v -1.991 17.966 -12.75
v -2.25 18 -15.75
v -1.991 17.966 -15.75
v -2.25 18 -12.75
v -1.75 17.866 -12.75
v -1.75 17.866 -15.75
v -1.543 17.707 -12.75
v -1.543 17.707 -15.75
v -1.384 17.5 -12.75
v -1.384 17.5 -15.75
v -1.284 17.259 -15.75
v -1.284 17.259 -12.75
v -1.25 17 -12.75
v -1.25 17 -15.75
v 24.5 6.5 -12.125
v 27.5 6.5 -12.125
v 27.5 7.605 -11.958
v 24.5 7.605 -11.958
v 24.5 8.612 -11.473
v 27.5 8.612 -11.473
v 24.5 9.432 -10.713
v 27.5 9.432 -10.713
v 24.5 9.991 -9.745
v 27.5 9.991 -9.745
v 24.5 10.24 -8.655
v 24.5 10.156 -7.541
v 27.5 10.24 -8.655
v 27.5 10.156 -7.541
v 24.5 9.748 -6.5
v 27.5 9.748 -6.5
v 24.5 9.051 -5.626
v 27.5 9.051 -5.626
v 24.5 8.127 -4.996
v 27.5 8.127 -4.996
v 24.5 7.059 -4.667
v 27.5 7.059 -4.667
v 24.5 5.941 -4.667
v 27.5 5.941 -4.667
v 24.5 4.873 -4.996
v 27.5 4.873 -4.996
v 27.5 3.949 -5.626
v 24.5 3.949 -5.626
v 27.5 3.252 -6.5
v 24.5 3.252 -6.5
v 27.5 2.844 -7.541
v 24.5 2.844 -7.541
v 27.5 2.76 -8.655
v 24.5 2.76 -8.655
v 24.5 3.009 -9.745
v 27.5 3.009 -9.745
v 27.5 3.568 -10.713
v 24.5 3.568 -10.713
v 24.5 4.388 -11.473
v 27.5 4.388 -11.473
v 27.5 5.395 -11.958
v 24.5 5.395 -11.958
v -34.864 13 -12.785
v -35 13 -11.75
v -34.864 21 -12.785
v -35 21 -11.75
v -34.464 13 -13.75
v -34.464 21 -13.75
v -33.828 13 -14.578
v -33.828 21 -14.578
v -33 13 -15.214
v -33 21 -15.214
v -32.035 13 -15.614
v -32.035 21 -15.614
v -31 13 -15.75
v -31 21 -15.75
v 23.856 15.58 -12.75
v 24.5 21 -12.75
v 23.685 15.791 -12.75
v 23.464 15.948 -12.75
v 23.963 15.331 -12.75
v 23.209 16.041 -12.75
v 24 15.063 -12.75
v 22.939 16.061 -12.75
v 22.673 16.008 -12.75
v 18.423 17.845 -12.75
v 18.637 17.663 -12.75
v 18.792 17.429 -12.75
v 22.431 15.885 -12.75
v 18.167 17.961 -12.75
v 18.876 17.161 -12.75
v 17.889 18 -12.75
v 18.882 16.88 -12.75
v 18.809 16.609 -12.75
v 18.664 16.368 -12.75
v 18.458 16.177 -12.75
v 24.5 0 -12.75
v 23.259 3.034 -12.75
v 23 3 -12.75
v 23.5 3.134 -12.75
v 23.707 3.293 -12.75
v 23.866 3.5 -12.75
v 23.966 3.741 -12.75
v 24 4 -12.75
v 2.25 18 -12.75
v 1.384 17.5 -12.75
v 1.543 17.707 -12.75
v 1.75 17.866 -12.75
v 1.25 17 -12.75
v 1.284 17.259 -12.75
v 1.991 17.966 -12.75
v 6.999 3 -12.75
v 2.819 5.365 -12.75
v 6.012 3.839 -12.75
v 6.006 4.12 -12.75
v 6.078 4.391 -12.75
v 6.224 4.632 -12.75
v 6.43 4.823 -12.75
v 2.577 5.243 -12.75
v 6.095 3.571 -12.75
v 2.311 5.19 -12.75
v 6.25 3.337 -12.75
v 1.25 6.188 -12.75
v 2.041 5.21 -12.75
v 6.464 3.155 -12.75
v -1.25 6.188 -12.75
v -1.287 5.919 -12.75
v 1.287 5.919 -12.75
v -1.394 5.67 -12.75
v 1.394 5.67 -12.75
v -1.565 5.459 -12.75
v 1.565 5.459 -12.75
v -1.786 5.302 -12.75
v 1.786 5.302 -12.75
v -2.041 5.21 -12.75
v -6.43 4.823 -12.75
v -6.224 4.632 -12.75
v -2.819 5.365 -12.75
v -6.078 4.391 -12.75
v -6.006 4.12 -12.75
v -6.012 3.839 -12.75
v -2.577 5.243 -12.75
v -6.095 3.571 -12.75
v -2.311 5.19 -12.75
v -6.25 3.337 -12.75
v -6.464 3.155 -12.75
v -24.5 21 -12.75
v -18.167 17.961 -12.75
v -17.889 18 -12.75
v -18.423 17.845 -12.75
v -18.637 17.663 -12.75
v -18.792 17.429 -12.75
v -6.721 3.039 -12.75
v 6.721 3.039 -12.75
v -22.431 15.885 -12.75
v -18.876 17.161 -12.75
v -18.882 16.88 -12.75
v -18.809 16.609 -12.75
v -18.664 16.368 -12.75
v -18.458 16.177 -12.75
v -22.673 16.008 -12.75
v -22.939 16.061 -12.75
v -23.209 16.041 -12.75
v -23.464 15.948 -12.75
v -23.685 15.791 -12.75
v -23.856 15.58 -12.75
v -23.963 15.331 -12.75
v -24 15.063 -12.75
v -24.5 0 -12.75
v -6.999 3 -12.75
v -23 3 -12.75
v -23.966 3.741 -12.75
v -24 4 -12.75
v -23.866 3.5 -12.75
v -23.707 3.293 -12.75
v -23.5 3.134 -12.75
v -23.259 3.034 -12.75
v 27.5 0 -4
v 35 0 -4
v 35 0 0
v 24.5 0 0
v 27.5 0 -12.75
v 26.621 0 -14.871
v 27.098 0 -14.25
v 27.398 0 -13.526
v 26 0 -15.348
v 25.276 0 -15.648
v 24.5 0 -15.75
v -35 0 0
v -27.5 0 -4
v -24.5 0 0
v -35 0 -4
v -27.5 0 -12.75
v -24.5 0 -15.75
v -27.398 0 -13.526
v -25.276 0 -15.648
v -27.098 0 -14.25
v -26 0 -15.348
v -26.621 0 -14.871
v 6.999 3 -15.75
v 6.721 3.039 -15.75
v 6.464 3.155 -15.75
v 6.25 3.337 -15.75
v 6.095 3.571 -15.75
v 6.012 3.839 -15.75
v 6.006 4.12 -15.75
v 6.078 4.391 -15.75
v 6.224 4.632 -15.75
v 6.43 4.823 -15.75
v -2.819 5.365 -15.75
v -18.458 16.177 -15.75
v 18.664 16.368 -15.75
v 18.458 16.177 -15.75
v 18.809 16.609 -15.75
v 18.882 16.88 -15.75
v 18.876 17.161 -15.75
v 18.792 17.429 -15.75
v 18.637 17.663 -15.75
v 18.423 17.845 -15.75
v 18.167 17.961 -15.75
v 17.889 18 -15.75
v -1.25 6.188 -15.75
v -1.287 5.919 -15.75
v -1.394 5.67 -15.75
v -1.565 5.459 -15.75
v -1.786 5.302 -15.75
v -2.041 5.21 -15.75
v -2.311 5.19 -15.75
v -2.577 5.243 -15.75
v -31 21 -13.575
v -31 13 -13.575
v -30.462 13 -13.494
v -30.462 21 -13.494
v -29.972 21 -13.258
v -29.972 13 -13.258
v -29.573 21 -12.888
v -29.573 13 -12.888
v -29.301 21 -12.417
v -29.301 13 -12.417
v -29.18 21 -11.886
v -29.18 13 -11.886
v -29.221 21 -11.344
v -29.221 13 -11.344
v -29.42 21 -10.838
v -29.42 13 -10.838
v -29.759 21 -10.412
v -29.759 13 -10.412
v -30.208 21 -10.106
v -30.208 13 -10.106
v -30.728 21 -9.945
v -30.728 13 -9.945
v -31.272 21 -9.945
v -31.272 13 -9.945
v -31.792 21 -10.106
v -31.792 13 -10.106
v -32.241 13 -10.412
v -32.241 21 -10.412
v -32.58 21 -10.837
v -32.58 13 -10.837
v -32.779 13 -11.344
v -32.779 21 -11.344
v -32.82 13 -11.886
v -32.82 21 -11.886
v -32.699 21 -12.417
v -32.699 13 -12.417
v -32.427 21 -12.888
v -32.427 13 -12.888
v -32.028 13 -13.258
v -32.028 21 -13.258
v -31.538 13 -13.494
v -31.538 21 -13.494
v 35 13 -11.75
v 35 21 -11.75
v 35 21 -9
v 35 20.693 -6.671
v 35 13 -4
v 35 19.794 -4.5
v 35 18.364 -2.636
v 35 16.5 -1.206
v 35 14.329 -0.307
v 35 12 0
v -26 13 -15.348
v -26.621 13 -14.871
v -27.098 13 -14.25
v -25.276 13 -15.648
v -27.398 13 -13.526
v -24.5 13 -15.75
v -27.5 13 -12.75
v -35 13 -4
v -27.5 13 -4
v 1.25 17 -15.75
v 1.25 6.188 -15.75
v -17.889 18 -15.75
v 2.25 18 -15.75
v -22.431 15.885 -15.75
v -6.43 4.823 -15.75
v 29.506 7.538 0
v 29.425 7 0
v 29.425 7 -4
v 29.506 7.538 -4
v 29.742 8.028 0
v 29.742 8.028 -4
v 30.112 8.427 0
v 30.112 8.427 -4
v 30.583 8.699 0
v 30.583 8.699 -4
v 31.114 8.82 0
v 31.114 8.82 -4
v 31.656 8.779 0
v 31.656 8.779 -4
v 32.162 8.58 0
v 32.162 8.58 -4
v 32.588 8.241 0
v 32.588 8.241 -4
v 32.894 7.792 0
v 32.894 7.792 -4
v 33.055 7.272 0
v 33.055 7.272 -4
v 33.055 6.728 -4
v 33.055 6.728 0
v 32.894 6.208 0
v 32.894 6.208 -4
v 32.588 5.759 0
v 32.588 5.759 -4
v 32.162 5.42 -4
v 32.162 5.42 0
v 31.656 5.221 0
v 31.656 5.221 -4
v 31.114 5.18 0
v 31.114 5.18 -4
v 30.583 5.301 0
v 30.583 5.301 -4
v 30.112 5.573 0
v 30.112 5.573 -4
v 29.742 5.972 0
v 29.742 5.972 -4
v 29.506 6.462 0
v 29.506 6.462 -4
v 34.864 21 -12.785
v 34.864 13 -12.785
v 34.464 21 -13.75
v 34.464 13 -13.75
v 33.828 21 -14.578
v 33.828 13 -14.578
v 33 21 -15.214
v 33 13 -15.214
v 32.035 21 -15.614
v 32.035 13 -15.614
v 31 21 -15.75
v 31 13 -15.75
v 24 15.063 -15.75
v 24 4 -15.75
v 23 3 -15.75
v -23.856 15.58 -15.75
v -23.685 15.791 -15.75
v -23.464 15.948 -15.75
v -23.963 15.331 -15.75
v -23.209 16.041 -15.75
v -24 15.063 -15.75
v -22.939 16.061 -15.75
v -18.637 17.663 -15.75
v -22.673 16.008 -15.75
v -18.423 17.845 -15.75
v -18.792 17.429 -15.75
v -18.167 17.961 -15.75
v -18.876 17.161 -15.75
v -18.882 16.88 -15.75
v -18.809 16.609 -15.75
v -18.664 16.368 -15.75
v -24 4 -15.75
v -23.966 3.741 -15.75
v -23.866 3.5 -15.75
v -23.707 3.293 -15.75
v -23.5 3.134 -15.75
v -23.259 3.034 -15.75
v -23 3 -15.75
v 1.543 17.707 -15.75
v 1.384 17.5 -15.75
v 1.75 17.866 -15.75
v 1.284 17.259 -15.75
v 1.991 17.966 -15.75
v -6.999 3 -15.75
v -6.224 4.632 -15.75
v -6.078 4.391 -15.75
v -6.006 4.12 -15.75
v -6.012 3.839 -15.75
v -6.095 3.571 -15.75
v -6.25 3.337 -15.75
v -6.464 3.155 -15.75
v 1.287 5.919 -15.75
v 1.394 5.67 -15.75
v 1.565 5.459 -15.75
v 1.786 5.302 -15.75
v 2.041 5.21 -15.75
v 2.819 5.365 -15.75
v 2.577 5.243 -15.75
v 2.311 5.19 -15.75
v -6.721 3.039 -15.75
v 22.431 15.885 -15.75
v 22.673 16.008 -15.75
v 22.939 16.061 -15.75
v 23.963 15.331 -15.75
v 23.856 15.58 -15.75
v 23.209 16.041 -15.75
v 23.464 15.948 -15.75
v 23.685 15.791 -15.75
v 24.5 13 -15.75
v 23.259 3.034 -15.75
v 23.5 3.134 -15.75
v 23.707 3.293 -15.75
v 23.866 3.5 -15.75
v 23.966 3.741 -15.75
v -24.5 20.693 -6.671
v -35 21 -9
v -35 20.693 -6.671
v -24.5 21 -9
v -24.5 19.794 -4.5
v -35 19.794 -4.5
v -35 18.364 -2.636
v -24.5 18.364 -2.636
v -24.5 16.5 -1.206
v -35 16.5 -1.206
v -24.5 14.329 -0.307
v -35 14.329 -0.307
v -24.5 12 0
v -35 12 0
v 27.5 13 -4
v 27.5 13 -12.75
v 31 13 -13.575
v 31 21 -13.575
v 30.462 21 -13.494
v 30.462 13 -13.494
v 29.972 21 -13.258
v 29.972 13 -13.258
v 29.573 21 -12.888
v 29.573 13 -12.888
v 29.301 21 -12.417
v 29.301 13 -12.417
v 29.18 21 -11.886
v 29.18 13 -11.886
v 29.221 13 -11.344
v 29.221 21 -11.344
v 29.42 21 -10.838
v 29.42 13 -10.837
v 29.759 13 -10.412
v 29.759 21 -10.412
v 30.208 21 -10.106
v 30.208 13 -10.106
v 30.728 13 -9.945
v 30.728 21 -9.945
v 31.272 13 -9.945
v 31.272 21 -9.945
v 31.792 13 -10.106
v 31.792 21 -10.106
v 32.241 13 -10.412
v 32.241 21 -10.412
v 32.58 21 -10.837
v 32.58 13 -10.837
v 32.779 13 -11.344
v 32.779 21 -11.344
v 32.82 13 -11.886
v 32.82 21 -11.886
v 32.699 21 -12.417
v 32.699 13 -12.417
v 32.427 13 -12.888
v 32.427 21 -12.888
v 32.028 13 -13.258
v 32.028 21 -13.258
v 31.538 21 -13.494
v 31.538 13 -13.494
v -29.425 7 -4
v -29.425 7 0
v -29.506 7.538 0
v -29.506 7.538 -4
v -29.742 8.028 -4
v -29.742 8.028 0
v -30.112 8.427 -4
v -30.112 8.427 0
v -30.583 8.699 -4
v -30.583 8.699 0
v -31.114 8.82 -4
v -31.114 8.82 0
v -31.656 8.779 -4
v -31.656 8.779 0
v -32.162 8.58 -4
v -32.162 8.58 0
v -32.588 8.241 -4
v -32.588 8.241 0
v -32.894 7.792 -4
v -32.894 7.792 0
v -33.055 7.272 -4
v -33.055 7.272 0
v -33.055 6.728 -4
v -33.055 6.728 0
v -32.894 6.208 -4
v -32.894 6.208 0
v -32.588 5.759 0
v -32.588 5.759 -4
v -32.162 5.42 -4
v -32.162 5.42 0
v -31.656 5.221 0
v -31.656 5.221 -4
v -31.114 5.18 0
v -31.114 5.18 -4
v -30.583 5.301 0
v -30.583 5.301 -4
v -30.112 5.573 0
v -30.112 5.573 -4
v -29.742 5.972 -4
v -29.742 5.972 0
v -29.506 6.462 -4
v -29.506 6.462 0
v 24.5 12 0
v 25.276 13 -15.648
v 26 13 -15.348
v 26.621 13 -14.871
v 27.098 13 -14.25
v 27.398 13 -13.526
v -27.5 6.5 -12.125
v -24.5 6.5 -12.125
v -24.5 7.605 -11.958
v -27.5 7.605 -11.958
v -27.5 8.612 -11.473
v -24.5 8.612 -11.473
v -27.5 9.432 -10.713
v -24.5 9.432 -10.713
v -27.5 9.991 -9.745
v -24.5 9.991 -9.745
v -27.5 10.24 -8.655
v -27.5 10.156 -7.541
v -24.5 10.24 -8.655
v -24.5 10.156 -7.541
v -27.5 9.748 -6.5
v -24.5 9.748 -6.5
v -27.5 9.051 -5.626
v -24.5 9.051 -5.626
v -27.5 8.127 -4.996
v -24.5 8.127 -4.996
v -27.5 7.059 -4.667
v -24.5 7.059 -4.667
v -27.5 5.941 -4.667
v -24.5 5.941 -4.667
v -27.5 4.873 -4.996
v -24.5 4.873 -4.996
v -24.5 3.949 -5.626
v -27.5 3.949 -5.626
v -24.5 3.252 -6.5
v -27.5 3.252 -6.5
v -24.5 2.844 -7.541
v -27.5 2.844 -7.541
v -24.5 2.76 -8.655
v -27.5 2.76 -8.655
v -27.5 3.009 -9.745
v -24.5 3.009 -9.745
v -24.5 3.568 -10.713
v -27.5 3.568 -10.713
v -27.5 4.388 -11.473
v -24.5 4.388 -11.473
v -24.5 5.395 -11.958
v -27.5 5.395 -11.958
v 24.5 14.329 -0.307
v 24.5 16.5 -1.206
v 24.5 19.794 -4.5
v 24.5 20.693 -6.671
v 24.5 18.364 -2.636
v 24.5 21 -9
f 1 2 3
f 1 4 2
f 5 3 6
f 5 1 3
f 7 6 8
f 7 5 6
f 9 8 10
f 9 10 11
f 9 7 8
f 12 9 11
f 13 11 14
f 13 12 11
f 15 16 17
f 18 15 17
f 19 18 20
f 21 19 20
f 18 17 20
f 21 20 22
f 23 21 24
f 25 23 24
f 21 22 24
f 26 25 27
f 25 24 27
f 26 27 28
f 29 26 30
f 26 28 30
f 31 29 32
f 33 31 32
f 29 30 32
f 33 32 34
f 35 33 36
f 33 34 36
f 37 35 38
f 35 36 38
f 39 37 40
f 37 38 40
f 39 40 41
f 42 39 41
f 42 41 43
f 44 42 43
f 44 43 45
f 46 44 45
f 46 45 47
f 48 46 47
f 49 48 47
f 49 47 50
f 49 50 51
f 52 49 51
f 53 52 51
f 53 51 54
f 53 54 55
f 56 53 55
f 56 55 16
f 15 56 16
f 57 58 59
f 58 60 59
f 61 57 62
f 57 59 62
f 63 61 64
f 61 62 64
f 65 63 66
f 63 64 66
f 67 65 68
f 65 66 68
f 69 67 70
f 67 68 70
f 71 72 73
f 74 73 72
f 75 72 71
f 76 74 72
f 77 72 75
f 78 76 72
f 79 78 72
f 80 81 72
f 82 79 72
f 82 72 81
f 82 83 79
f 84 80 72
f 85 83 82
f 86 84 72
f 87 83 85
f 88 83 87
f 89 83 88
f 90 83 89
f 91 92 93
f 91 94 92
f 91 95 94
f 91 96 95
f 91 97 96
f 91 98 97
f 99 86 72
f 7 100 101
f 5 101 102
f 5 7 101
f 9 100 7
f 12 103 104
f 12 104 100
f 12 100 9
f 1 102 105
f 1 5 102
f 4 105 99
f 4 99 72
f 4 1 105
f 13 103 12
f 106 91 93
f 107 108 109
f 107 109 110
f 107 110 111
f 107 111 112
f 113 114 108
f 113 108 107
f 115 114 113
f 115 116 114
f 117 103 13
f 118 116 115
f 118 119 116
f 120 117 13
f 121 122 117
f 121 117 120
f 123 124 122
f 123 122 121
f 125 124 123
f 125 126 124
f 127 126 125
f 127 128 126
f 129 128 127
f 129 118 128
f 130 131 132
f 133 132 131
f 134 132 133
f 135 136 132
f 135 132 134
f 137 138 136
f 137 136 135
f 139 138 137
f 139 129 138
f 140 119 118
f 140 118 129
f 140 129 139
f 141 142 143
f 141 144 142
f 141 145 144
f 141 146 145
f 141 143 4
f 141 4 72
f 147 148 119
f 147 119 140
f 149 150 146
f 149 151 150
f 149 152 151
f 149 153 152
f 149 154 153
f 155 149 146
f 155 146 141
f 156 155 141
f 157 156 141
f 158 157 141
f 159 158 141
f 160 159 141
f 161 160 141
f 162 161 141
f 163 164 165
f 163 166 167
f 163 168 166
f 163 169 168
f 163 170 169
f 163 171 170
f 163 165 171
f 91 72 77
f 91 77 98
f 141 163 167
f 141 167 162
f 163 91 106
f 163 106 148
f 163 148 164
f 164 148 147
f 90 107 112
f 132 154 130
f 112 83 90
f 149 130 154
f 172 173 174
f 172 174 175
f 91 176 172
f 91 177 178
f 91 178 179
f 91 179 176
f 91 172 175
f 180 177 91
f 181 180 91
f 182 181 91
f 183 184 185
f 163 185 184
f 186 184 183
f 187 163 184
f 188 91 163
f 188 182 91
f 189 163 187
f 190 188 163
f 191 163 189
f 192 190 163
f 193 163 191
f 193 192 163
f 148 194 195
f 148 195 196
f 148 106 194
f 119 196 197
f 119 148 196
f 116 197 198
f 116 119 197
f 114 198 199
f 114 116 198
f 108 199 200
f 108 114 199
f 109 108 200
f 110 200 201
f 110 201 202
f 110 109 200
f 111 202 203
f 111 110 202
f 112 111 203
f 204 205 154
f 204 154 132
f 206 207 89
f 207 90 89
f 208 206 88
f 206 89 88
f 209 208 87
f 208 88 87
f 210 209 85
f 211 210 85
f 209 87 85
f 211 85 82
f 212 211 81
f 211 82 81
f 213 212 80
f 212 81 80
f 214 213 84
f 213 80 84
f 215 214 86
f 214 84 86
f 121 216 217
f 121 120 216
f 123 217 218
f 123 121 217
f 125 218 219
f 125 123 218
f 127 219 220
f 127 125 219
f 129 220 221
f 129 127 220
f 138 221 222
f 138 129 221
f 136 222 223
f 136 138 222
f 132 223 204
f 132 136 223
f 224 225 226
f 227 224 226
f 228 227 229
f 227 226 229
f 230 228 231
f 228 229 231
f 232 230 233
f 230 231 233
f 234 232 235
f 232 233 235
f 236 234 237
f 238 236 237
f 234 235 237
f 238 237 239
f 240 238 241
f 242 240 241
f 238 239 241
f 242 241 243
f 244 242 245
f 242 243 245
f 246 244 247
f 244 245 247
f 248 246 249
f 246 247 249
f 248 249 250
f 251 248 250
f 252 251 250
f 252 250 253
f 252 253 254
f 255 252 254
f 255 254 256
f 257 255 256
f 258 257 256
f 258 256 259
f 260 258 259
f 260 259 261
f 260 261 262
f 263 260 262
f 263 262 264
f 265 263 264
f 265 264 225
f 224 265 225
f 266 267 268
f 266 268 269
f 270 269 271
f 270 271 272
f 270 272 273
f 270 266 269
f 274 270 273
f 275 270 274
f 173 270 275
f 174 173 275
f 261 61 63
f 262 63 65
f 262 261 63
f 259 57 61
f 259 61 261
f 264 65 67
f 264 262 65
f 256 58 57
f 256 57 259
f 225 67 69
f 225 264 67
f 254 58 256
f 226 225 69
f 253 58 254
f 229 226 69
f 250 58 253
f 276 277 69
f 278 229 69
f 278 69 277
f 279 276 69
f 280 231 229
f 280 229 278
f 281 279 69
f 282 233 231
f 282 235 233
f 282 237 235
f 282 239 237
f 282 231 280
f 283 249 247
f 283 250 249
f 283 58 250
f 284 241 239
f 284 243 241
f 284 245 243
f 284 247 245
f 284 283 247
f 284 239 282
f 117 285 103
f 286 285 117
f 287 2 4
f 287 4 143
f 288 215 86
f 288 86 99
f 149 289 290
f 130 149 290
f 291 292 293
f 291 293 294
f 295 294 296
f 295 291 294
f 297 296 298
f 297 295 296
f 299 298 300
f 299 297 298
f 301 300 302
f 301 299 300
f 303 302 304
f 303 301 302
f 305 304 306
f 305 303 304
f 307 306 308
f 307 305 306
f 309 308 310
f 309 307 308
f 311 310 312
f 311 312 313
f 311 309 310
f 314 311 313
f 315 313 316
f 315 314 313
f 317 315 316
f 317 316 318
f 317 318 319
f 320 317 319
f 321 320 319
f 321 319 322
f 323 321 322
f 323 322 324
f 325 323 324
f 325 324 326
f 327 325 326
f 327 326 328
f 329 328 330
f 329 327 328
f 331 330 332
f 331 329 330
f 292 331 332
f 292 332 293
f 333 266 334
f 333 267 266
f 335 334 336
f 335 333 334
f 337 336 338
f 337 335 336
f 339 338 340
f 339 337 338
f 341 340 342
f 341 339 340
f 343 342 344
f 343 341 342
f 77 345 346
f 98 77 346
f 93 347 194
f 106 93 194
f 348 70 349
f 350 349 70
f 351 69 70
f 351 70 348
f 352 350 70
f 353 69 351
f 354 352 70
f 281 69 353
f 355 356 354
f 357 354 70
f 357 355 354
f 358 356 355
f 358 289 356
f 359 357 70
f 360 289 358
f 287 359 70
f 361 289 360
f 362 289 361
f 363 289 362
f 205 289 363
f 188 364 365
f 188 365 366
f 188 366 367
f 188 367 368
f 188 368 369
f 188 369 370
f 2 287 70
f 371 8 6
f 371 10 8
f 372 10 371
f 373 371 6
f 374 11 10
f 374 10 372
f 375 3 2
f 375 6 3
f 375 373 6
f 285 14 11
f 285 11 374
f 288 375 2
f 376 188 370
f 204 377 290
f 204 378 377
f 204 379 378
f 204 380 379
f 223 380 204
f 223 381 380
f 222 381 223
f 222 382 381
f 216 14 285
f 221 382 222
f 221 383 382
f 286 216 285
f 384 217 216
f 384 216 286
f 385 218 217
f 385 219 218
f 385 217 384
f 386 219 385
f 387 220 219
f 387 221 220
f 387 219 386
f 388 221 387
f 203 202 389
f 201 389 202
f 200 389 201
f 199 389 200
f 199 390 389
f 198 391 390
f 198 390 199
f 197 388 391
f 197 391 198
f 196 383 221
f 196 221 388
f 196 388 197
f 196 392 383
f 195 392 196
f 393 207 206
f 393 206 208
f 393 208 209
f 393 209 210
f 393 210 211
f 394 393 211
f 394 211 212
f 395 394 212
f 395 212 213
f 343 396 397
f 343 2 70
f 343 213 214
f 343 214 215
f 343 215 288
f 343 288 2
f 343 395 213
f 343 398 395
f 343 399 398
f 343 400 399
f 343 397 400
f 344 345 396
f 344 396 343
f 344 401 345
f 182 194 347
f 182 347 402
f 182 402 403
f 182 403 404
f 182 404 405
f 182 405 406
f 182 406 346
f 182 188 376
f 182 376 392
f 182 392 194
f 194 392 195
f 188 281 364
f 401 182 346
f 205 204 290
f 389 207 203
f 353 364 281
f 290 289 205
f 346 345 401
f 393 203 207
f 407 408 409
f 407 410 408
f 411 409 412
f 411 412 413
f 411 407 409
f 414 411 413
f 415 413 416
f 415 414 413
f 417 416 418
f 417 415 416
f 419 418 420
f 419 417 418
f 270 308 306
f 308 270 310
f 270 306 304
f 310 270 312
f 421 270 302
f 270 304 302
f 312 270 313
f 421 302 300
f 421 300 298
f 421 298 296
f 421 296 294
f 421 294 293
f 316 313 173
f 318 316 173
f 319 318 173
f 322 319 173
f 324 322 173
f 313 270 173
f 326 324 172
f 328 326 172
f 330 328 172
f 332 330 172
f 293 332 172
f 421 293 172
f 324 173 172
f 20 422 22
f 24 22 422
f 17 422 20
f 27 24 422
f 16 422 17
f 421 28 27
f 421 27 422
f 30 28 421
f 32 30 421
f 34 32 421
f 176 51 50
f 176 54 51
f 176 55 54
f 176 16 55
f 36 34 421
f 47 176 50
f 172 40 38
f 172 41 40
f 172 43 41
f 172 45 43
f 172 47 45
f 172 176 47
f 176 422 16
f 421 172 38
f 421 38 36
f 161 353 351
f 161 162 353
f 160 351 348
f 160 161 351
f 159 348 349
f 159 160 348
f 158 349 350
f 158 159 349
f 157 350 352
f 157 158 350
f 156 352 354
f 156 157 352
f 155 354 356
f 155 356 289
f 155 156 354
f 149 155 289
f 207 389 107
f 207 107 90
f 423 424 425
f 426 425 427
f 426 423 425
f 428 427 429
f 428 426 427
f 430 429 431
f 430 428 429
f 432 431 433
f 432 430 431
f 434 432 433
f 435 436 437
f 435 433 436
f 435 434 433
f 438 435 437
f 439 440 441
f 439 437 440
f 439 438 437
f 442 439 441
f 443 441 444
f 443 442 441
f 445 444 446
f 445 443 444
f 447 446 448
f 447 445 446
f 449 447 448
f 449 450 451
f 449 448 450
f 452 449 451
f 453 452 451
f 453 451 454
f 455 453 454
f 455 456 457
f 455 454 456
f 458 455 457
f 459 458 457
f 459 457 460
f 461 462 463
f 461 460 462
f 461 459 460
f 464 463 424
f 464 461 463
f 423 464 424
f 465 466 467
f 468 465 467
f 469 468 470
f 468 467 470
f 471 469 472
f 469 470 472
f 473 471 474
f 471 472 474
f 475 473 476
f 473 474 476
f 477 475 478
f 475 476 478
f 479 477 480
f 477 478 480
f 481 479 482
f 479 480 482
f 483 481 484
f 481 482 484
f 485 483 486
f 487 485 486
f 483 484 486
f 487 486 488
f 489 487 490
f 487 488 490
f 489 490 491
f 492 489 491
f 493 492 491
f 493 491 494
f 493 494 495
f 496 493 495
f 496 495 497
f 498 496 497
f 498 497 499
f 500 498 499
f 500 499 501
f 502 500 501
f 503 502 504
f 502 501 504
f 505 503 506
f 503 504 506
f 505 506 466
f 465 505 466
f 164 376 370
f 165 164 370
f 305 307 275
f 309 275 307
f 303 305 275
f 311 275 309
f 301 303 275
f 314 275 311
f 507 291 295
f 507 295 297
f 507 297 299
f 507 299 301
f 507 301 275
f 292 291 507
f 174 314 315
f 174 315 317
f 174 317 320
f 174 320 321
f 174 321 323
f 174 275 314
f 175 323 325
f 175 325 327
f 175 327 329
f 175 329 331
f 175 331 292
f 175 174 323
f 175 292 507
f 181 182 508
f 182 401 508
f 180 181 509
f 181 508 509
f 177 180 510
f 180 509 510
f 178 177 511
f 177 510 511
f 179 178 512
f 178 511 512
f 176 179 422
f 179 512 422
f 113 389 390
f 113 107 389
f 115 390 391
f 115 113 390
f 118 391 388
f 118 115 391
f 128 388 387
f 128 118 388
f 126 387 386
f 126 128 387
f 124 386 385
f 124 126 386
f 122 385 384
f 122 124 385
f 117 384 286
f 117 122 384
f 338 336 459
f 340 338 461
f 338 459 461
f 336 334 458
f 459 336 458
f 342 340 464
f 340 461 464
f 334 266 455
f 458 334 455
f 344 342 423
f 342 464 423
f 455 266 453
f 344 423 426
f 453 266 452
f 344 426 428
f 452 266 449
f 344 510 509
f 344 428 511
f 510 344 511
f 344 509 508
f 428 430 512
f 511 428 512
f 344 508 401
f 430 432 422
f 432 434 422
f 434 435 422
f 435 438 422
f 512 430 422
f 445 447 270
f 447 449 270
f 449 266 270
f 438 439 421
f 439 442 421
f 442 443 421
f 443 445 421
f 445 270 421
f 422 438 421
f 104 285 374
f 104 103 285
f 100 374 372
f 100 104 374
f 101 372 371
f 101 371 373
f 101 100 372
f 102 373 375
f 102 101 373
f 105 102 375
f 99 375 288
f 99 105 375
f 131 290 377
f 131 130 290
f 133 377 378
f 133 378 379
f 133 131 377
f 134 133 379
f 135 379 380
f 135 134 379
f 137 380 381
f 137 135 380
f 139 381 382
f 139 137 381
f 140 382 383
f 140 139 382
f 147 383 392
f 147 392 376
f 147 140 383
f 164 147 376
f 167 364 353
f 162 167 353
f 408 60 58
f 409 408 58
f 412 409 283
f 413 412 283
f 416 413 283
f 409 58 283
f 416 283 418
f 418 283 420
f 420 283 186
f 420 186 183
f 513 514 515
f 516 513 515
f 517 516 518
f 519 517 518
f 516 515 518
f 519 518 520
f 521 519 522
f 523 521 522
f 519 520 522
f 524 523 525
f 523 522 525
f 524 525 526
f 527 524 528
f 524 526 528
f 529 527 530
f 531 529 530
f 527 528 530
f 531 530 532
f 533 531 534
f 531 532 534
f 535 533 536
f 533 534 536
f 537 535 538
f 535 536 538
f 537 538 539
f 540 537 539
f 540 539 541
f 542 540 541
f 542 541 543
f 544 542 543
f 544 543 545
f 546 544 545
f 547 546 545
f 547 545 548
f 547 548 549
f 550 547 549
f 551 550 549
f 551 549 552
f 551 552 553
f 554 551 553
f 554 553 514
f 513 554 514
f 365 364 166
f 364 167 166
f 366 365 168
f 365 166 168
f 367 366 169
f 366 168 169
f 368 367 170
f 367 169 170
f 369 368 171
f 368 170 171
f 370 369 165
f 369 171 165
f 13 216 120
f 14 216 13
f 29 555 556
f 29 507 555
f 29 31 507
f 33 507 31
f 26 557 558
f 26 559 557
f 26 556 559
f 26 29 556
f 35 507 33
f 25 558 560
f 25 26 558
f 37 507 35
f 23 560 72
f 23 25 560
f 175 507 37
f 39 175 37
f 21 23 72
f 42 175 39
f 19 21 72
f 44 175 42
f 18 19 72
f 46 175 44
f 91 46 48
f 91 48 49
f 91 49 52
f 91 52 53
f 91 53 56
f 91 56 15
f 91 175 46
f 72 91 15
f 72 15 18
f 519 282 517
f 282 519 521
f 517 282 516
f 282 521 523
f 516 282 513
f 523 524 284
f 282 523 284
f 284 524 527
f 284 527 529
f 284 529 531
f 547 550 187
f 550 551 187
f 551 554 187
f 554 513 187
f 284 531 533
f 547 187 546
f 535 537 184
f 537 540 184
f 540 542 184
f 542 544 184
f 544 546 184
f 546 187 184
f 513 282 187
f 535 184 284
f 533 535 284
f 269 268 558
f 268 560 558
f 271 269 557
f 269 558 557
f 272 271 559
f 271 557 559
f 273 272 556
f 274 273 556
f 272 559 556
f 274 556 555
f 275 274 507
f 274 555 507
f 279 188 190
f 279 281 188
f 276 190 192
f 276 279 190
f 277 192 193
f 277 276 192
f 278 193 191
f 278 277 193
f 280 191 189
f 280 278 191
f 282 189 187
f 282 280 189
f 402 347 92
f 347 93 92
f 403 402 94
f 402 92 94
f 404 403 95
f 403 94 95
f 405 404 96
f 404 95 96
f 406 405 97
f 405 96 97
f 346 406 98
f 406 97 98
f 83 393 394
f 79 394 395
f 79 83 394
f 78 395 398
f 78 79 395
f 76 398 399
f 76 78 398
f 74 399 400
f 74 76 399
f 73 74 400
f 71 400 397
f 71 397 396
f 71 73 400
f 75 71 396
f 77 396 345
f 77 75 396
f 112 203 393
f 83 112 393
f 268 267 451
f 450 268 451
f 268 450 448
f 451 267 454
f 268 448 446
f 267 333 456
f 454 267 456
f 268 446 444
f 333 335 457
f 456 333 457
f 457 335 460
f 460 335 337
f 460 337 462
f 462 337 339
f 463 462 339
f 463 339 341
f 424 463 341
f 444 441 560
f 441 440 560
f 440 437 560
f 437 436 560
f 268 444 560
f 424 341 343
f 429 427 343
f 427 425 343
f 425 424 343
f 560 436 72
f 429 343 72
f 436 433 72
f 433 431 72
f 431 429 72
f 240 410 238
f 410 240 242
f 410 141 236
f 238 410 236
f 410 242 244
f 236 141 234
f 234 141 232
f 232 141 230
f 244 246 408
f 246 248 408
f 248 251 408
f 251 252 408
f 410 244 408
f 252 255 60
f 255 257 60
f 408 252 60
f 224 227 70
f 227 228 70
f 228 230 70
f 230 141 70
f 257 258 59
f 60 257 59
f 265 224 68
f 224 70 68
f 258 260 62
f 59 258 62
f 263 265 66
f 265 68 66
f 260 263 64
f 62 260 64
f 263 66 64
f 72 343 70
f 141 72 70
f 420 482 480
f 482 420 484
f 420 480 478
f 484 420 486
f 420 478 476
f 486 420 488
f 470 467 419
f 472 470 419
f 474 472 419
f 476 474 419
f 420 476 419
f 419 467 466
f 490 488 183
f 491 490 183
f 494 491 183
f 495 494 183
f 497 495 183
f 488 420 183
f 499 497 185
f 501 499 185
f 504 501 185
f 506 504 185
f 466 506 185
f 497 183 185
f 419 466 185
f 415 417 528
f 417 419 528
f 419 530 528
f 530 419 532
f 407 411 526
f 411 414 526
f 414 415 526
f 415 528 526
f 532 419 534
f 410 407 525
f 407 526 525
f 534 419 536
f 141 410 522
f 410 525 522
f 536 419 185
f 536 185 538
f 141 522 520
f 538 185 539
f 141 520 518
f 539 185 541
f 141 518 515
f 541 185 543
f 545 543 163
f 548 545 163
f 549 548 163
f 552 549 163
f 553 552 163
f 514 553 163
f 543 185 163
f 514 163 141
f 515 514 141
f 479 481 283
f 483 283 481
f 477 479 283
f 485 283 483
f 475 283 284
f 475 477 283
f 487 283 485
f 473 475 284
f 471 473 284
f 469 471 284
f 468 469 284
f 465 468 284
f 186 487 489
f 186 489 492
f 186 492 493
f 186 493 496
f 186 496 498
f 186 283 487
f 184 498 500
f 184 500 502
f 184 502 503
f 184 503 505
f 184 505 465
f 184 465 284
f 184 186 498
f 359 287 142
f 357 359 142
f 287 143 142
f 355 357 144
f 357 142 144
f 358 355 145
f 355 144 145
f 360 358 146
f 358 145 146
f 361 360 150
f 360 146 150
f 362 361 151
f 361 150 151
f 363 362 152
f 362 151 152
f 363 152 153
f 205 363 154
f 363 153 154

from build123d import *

# Parameters (mm, degrees)
BOSS_EXTRUDE1_DEPTH  = 21
SKETCH2_R            = 1.825
CUT_EXTRUDE1_DEPTH   = 4
SKETCH3_W            = 7.5
SKETCH3_H            = 11.75
CUT_EXTRUDE2_DEPTH   = 13
FILLET1_R            = 4
SKETCH5_R            = 1.825
CUT_EXTRUDE3_DEPTH   = 41.522370365
FILLET1_OF_MIRROR1_R = 4
CUT_EXTRUDE5_DEPTH   = 44.75
FILLET2_R            = 1
FILLET3_R            = 9
FILLET4_R            = 3
SKETCH11_R           = 3.75
CUT_EXTRUDE6_DEPTH   = 68.788734315


with BuildPart() as part:
    # Sketch1 → Boss-Extrude1 (new body)
    with BuildSketch(Plane(origin=(0, 0, 0), x_dir=(1, 0, 0), z_dir=(0, 1, 0))):
        Polygon((-24.5, 0), (-24.5, 12.75), (0, 12.75), (0, 15.75), (-35, 15.75), (-35, 0), align=None)
    boss_extrude1 = extrude(amount=BOSS_EXTRUDE1_DEPTH)

    # Sketch2 → Cut-Extrude1 (cut)
    with BuildSketch(Plane.XY):
        with Locations((-31.25, 7)):
            Circle(SKETCH2_R)
    cut_extrude1 = extrude(amount=-CUT_EXTRUDE1_DEPTH, mode=Mode.SUBTRACT)

    # Sketch3 → Cut-Extrude2 (cut)
    with BuildSketch(Plane.XZ):
        with Locations((-31.25, -9.875)):
            Rectangle(SKETCH3_W, SKETCH3_H)
    cut_extrude2 = extrude(amount=-CUT_EXTRUDE2_DEPTH, mode=Mode.SUBTRACT)

    # Fillet1
    fillet1_edges = [part.edges().sort_by_distance(p)[0] for p in [
        (-35, 17, -15.75),
    ]]
    fillet(fillet1_edges, radius=FILLET1_R)

    # Sketch5 → Cut-Extrude3 (cut, through all)
    with BuildSketch(Plane.XZ.offset(-13)):
        with Locations(Location((-31, -11.75, 0), (0, 0, 270))):
            Circle(SKETCH5_R)
    cut_extrude3 = extrude(amount=-CUT_EXTRUDE3_DEPTH, mode=Mode.SUBTRACT)

    # Mirror1: Boss-Extrude1, Cut-Extrude1, Cut-Extrude2, Cut-Extrude3 across plane
    add(boss_extrude1.mirror(Plane(origin=(0, 21, 0), x_dir=(0, 0, 1), z_dir=(-1, 0, 0))))
    add(cut_extrude1.mirror(Plane(origin=(0, 21, 0), x_dir=(0, 0, 1), z_dir=(-1, 0, 0))), mode=Mode.SUBTRACT)
    add(cut_extrude2.mirror(Plane(origin=(0, 21, 0), x_dir=(0, 0, 1), z_dir=(-1, 0, 0))), mode=Mode.SUBTRACT)
    add(cut_extrude3.mirror(Plane(origin=(0, 21, 0), x_dir=(0, 0, 1), z_dir=(-1, 0, 0))), mode=Mode.SUBTRACT)

    # Fillet1 of Mirror1
    fillet1_of_mirror1_edges = [part.edges().sort_by_distance(p)[0] for p in [
        (35, 17, -15.75),
    ]]
    fillet(fillet1_of_mirror1_edges, radius=FILLET1_OF_MIRROR1_R)

    # Sketch10 → Cut-Extrude5 (cut, through all)
    with BuildSketch(Plane(origin=(0, 0, -15.75), x_dir=(-1, 0, 0), z_dir=(0, 0, -1))):
        Polygon((-24, 3), (-3.793861182, 3), (-24, 16.969897852), align=None)
        Polygon((-21.093861182, 18), (-1.25, 18), (-1.25, 4.280569672), align=None)
        Polygon((24, 3), (24, 16.969897852), (3.793861182, 3), align=None)
        Polygon((21.093861182, 18), (1.25, 4.280569672), (1.25, 18), align=None)
    extrude(amount=-CUT_EXTRUDE5_DEPTH, mode=Mode.SUBTRACT)

    # Fillet2
    fillet2_edges = [part.edges().sort_by_distance(p)[0] for p in [
        (-24, 3, -14.25),
        (-3.793861182, 3, -14.25),
        (-24, 16.969897852, -14.25),
        (24, 3, -14.25),
        (24, 16.969897852, -14.25),
        (3.793861182, 3, -14.25),
        (-1.25, 18, -14.25),
        (-21.093861182, 18, -14.25),
        (-1.25, 4.280569672, -14.25),
        (1.25, 4.280569672, -14.25),
        (21.093861182, 18, -14.25),
        (1.25, 18, -14.25),
    ]]
    fillet(fillet2_edges, radius=FILLET2_R)

    # Fillet3
    fillet3_edges = [part.edges().sort_by_distance(p)[0] for p in [
        (-29.75, 21, 0),
        (29.75, 21, 0),
    ]]
    fillet(fillet3_edges, radius=FILLET3_R)

    # Fillet4
    fillet4_edges = [part.edges().sort_by_distance(p)[0] for p in [
        (-27.5, 6.5, -15.75),
        (27.5, 6.5, -15.75),
    ]]
    fillet(fillet4_edges, radius=FILLET4_R)

    # Sketch11 → Cut-Extrude6 (cut, through all)
    with BuildSketch(Plane(origin=(27.5, 0, 0), x_dir=(0, 0, -1), z_dir=(1, 0, 0))):
        with Locations((8.375, 6.5)):
            Circle(SKETCH11_R)
    extrude(amount=-CUT_EXTRUDE6_DEPTH, mode=Mode.SUBTRACT)


solid = part.part
